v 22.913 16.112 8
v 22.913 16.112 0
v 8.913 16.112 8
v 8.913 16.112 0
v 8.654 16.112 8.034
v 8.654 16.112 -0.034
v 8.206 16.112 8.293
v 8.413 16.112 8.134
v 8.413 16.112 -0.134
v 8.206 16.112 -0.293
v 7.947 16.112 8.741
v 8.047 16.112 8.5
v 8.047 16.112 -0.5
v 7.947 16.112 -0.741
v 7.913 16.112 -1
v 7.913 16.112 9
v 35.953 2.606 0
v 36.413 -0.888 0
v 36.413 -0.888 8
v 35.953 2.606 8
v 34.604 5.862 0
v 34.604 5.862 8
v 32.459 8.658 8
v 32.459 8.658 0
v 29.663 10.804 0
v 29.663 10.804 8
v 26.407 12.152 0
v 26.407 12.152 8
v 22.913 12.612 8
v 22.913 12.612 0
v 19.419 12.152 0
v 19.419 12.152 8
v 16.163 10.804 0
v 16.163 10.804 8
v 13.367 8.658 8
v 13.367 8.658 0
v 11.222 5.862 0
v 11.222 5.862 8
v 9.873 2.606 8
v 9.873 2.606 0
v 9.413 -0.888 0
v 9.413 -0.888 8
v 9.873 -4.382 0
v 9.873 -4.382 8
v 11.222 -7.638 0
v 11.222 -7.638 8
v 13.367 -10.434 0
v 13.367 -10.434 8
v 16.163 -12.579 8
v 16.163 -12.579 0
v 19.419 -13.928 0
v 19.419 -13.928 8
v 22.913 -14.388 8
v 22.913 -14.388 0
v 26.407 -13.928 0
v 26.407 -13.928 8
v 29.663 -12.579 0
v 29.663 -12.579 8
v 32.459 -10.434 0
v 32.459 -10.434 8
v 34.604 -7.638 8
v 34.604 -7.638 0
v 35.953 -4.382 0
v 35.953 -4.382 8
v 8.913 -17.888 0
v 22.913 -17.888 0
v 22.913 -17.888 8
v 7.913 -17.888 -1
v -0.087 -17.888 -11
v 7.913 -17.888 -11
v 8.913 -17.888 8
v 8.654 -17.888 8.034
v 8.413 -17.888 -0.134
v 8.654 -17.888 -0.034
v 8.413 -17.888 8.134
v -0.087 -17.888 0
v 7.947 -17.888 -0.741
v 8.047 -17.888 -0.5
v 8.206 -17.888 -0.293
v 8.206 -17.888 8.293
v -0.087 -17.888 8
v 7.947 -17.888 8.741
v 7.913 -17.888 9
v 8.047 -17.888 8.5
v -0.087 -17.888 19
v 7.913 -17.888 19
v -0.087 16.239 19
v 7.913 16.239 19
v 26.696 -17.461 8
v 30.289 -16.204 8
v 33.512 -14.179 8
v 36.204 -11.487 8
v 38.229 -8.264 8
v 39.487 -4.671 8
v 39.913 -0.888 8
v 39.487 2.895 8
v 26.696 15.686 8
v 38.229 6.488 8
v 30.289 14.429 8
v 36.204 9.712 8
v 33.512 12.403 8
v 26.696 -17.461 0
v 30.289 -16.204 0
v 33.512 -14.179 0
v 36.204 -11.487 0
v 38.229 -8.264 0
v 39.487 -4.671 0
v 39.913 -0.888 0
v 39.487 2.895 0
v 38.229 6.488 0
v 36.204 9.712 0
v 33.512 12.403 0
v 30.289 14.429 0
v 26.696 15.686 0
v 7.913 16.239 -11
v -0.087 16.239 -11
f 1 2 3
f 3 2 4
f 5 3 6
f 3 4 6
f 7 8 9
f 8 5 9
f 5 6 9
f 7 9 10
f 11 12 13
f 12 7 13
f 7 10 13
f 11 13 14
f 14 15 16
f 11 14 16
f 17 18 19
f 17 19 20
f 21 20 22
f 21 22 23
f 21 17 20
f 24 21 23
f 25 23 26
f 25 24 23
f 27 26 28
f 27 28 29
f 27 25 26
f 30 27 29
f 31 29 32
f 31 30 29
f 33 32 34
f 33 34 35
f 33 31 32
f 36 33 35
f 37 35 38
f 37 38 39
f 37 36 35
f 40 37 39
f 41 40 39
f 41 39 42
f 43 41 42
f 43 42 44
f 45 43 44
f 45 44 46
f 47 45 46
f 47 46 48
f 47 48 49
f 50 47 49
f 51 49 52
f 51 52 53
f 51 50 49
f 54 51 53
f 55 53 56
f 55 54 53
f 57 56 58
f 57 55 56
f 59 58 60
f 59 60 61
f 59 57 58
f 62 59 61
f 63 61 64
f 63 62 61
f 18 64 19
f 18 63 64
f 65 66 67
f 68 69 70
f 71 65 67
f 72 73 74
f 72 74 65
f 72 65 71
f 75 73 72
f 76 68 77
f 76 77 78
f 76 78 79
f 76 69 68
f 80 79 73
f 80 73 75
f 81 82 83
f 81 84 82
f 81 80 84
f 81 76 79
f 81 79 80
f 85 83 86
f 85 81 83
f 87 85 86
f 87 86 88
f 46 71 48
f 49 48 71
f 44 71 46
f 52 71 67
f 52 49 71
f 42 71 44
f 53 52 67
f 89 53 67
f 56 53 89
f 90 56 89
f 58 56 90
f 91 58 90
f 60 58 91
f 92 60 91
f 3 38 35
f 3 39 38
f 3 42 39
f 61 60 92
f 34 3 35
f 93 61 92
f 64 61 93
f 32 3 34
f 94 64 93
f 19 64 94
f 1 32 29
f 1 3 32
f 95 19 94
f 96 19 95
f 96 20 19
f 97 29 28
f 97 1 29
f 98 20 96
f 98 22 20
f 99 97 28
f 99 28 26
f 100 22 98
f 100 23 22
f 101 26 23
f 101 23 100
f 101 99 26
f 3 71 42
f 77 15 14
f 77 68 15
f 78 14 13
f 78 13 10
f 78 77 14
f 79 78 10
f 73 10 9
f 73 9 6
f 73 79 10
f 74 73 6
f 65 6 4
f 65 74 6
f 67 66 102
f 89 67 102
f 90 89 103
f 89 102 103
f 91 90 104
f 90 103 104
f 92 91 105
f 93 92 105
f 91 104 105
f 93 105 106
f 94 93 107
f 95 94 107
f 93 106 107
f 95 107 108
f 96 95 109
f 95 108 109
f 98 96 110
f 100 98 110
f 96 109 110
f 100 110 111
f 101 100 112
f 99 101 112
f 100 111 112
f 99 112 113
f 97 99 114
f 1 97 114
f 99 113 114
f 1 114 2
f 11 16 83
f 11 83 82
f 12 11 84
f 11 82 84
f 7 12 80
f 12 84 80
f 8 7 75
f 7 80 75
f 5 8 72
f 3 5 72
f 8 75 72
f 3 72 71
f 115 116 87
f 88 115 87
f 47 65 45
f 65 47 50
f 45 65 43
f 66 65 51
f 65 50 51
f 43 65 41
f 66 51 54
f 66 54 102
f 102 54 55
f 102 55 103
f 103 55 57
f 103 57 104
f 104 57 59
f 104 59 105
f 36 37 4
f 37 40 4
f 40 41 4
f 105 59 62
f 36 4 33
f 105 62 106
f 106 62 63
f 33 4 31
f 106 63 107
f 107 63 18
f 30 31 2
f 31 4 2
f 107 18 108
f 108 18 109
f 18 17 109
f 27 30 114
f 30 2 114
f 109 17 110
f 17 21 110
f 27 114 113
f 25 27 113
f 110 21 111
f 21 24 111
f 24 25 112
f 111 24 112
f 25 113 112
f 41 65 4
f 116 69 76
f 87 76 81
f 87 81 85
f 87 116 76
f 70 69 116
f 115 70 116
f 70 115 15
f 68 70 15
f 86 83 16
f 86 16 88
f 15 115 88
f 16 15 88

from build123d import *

# Parameters (mm, degrees)
SKETCH2_R           = 13.5
BOSS_EXTRUDE1_DEPTH = 8
SKETCH3_W           = 30
SKETCH3_H           = 34.126910457
BOSS_EXTRUDE2_DEPTH = 8
FILLET1_R           = 1


with BuildPart() as part:
    # Sketch2 → Boss-Extrude1 (new body)
    with BuildSketch(Plane.XY):
        with BuildLine():
            Line((22.912878475, 16.112283523), (-0.087121525, 16.112283523))
            Line((-0.087121525, 16.112283523), (-0.087121525, -17.887716477))
            Line((-0.087121525, -17.887716477), (22.912878475, -17.887716477))
            ThreePointArc((22.912878475, -17.887716477), (39.912878475, -0.887716477), (22.912878475, 16.112283523))
        make_face()
        with Locations((22.912878475, -0.887716477)):
            Circle(SKETCH2_R, mode=Mode.SUBTRACT)
    extrude(amount=BOSS_EXTRUDE1_DEPTH)

    # Sketch3 → Boss-Extrude2 (add)
    with BuildSketch(Plane.ZY.offset(0.087121525)):
        with Locations((4, -0.824261249)):
            Rectangle(SKETCH3_W, SKETCH3_H)
    extrude(amount=-BOSS_EXTRUDE2_DEPTH)

    # Fillet1
    fillet1_edges = [part.edges().sort_by_distance(p)[0] for p in [
        (7.912878475, -0.887716477, 8),
        (7.912878475, -0.887716477, 0),
    ]]
    fillet(fillet1_edges, radius=FILLET1_R)


solid = part.part
